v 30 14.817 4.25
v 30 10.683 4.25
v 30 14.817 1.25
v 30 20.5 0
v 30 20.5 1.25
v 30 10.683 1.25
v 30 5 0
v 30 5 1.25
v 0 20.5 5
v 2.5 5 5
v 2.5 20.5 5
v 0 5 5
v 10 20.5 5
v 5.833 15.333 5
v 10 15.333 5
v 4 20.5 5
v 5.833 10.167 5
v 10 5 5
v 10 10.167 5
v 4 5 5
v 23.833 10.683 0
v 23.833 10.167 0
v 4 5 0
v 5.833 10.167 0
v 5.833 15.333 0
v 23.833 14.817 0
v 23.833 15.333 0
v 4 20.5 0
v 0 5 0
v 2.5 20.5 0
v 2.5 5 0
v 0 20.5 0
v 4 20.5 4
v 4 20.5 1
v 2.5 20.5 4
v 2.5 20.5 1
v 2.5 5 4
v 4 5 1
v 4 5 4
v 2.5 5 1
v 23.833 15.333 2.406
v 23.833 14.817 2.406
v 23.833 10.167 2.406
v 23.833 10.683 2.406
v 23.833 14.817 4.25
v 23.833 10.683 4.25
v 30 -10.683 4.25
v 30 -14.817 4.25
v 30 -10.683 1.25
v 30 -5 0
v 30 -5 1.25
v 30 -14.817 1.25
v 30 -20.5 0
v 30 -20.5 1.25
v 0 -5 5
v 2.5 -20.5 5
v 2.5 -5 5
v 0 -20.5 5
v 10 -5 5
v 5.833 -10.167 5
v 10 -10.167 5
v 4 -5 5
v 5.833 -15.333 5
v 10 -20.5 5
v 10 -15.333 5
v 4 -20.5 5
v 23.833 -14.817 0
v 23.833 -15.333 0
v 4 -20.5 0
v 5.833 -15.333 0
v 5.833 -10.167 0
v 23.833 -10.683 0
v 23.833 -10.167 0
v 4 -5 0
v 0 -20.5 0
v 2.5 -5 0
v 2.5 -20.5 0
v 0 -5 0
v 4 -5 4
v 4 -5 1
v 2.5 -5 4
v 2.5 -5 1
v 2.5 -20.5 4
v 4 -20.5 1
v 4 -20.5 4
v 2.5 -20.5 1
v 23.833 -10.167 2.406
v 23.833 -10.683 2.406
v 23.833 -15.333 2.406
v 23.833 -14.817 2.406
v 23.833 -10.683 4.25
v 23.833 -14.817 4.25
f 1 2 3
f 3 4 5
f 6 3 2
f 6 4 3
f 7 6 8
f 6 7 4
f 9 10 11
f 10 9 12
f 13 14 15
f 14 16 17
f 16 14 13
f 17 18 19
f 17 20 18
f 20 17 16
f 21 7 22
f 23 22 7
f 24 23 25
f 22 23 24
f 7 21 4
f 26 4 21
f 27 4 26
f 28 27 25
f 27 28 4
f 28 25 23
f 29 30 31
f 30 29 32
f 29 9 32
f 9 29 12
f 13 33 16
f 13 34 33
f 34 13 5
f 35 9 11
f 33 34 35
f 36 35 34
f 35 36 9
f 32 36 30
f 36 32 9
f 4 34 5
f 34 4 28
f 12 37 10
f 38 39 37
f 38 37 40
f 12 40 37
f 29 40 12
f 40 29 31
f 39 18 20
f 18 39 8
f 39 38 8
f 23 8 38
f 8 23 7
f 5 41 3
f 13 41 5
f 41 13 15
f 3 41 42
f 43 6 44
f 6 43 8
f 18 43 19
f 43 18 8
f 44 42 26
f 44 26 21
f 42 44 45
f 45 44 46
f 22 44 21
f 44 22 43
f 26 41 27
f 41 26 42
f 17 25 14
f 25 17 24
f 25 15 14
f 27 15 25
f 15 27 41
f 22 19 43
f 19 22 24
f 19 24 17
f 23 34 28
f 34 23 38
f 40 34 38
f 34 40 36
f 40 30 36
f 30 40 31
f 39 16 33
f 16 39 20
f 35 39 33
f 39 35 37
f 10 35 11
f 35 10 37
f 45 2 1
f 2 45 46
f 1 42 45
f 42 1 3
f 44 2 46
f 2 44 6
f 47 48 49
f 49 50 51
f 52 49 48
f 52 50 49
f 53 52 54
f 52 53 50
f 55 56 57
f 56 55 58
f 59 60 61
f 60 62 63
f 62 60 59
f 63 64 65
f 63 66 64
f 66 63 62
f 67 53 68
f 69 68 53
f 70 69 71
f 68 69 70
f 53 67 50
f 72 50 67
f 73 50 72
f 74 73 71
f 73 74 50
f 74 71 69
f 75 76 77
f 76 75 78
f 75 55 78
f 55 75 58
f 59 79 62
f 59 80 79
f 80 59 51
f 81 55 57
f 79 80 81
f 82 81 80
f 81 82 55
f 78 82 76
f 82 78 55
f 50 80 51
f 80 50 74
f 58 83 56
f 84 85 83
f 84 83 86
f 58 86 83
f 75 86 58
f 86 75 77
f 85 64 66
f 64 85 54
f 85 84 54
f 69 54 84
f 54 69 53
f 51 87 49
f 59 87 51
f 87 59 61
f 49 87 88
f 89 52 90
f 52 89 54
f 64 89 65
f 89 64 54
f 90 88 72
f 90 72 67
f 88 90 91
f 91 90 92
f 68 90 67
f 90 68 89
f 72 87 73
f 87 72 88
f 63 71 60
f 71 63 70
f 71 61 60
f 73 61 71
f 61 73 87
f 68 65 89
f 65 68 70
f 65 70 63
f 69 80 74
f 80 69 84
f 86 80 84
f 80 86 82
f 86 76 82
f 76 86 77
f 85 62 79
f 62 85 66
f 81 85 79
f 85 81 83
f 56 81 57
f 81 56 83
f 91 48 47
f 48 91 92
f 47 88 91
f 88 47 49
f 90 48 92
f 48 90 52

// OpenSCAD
/*
 *  Window Wedges
 *  Copyright (c) 2019 David M. Syzdek <david@syzdek.net>
 *
 *  Redistribution and use in source and binary forms, with or without
 *  modification, are permitted provided that the following conditions are
 *  met:
 *
 *     * Redistributions of source code must retain the above copyright
 *       notice, this list of conditions and the following disclaimer.
 *     * Redistributions in binary form must reproduce the above copyright
 *       notice, this list of conditions and the following disclaimer in the
 *       documentation and/or other materials provided with the distribution.
 *     * Neither the name of David M. Syzdek nor the
 *       names of its contributors may be used to endorse or promote products
 *       derived from this software without specific prior written permission.
 *
 *  THIS SOFTWARE IS PROVIDED BY THE COPYRIGHT HOLDERS AND CONTRIBUTORS "AS
 *  IS" AND ANY EXPRESS OR IMPLIED WARRANTIES, INCLUDING, BUT NOT LIMITED TO,
 *  THE IMPLIED WARRANTIES OF MERCHANTABILITY AND FITNESS FOR A PARTICULAR
 *  PURPOSE ARE DISCLAIMED. IN NO EVENT SHALL DAVID M. SYZDEK BE LIABLE FOR
 *  ANY DIRECT, INDIRECT, INCIDENTAL, SPECIAL, EXEMPLARY, OR CONSEQUENTIAL
 *  DAMAGES (INCLUDING, BUT NOT LIMITED TO, PROCUREMENT OF SUBSTITUTE GOODS OR
 *  SERVICES; LOSS OF USE, DATA, OR PROFITS; OR BUSINESS INTERRUPTION) HOWEVER
 *  CAUSED AND ON ANY THEORY OF LIABILITY, WHETHER IN CONTRACT, STRICT
 *  LIABILITY, OR TORT (INCLUDING NEGLIGENCE OR OTHERWISE) ARISING IN ANY WAY
 *  OUT OF THE USE OF THIS SOFTWARE, EVEN IF ADVISED OF THE POSSIBILITY OF
 *  SUCH DAMAGE.
 *
 *  This is a non-permanent, adjustable stopper for a casement window. The
 *  stopper works by placing two opposing, interlocked wedges within the
 *  track of the sash runner.  As the runner pushes against the wedges, the
 *  wedges lock into place using friction generated by the pressure on the
 *  wedges to prevent the sash from moving forward.
 *
 *  Window Wedges are used to create a casement window sash stopper.
 *
 *  To adjust the placement of the wedges:
 *     1. Loosen the wedges by using the fingernail notches to pull the wedges
 *        apart.
 *     2. Adjust the location of the wedges by pulling the leading wedge using
 *        the fingernail notches in the direction of intended adjustment.
 *     3. Once the wedges are adjusted to the desired location, squeeze the two
 *        wedges together to lock into place.
 */


w = 15.5;  // width
h =  5.0;  // height
s = 10.0;  // length of pull stub


l = h*4;              // length of slope
a = atan((h*0.75)/l); // angle of slope

module window_stopper()
{
   union()
   {
      difference()
      {
         // creates base
         translate([  0, 0, 0 ])
            cube([  l+s, w, h ], center = false);

         // cuts slope
         translate( [   s,  -1,   h ] )
            rotate( [   0,   a,   0 ] )
            cube(   [ l*2, w+2, h*2 ], center=false);

         // cuts slot for stopper
         translate([ s+1-(w/3), ((w/3)), -1 ] )
            cube(  [       l-2, ((w/3)), h+2 ], center=false);

         // cuts bottom fingernail tab
         translate([ 2.5,  -1,  -1 ] )
            cube([   1.5, w+2,   2 ], center=false);

         // cuts top fingernail tab
         translate([ 2.5,  -1, h-1 ] )
            cube([   1.5, w+2,   2 ], center=false);
      };

      // adds stopper
      translate( [ l+s-(w/3)-1, (w/3)*1.10,     0 ] )
         cube(   [     (w/3)+1, (w/3)*0.80, h*.85 ], center=false);
   };
};


// bottom stopper
translate([0,    5, 0]) window_stopper();
translate([0, -w-5, 0]) window_stopper();


/* end of script */
